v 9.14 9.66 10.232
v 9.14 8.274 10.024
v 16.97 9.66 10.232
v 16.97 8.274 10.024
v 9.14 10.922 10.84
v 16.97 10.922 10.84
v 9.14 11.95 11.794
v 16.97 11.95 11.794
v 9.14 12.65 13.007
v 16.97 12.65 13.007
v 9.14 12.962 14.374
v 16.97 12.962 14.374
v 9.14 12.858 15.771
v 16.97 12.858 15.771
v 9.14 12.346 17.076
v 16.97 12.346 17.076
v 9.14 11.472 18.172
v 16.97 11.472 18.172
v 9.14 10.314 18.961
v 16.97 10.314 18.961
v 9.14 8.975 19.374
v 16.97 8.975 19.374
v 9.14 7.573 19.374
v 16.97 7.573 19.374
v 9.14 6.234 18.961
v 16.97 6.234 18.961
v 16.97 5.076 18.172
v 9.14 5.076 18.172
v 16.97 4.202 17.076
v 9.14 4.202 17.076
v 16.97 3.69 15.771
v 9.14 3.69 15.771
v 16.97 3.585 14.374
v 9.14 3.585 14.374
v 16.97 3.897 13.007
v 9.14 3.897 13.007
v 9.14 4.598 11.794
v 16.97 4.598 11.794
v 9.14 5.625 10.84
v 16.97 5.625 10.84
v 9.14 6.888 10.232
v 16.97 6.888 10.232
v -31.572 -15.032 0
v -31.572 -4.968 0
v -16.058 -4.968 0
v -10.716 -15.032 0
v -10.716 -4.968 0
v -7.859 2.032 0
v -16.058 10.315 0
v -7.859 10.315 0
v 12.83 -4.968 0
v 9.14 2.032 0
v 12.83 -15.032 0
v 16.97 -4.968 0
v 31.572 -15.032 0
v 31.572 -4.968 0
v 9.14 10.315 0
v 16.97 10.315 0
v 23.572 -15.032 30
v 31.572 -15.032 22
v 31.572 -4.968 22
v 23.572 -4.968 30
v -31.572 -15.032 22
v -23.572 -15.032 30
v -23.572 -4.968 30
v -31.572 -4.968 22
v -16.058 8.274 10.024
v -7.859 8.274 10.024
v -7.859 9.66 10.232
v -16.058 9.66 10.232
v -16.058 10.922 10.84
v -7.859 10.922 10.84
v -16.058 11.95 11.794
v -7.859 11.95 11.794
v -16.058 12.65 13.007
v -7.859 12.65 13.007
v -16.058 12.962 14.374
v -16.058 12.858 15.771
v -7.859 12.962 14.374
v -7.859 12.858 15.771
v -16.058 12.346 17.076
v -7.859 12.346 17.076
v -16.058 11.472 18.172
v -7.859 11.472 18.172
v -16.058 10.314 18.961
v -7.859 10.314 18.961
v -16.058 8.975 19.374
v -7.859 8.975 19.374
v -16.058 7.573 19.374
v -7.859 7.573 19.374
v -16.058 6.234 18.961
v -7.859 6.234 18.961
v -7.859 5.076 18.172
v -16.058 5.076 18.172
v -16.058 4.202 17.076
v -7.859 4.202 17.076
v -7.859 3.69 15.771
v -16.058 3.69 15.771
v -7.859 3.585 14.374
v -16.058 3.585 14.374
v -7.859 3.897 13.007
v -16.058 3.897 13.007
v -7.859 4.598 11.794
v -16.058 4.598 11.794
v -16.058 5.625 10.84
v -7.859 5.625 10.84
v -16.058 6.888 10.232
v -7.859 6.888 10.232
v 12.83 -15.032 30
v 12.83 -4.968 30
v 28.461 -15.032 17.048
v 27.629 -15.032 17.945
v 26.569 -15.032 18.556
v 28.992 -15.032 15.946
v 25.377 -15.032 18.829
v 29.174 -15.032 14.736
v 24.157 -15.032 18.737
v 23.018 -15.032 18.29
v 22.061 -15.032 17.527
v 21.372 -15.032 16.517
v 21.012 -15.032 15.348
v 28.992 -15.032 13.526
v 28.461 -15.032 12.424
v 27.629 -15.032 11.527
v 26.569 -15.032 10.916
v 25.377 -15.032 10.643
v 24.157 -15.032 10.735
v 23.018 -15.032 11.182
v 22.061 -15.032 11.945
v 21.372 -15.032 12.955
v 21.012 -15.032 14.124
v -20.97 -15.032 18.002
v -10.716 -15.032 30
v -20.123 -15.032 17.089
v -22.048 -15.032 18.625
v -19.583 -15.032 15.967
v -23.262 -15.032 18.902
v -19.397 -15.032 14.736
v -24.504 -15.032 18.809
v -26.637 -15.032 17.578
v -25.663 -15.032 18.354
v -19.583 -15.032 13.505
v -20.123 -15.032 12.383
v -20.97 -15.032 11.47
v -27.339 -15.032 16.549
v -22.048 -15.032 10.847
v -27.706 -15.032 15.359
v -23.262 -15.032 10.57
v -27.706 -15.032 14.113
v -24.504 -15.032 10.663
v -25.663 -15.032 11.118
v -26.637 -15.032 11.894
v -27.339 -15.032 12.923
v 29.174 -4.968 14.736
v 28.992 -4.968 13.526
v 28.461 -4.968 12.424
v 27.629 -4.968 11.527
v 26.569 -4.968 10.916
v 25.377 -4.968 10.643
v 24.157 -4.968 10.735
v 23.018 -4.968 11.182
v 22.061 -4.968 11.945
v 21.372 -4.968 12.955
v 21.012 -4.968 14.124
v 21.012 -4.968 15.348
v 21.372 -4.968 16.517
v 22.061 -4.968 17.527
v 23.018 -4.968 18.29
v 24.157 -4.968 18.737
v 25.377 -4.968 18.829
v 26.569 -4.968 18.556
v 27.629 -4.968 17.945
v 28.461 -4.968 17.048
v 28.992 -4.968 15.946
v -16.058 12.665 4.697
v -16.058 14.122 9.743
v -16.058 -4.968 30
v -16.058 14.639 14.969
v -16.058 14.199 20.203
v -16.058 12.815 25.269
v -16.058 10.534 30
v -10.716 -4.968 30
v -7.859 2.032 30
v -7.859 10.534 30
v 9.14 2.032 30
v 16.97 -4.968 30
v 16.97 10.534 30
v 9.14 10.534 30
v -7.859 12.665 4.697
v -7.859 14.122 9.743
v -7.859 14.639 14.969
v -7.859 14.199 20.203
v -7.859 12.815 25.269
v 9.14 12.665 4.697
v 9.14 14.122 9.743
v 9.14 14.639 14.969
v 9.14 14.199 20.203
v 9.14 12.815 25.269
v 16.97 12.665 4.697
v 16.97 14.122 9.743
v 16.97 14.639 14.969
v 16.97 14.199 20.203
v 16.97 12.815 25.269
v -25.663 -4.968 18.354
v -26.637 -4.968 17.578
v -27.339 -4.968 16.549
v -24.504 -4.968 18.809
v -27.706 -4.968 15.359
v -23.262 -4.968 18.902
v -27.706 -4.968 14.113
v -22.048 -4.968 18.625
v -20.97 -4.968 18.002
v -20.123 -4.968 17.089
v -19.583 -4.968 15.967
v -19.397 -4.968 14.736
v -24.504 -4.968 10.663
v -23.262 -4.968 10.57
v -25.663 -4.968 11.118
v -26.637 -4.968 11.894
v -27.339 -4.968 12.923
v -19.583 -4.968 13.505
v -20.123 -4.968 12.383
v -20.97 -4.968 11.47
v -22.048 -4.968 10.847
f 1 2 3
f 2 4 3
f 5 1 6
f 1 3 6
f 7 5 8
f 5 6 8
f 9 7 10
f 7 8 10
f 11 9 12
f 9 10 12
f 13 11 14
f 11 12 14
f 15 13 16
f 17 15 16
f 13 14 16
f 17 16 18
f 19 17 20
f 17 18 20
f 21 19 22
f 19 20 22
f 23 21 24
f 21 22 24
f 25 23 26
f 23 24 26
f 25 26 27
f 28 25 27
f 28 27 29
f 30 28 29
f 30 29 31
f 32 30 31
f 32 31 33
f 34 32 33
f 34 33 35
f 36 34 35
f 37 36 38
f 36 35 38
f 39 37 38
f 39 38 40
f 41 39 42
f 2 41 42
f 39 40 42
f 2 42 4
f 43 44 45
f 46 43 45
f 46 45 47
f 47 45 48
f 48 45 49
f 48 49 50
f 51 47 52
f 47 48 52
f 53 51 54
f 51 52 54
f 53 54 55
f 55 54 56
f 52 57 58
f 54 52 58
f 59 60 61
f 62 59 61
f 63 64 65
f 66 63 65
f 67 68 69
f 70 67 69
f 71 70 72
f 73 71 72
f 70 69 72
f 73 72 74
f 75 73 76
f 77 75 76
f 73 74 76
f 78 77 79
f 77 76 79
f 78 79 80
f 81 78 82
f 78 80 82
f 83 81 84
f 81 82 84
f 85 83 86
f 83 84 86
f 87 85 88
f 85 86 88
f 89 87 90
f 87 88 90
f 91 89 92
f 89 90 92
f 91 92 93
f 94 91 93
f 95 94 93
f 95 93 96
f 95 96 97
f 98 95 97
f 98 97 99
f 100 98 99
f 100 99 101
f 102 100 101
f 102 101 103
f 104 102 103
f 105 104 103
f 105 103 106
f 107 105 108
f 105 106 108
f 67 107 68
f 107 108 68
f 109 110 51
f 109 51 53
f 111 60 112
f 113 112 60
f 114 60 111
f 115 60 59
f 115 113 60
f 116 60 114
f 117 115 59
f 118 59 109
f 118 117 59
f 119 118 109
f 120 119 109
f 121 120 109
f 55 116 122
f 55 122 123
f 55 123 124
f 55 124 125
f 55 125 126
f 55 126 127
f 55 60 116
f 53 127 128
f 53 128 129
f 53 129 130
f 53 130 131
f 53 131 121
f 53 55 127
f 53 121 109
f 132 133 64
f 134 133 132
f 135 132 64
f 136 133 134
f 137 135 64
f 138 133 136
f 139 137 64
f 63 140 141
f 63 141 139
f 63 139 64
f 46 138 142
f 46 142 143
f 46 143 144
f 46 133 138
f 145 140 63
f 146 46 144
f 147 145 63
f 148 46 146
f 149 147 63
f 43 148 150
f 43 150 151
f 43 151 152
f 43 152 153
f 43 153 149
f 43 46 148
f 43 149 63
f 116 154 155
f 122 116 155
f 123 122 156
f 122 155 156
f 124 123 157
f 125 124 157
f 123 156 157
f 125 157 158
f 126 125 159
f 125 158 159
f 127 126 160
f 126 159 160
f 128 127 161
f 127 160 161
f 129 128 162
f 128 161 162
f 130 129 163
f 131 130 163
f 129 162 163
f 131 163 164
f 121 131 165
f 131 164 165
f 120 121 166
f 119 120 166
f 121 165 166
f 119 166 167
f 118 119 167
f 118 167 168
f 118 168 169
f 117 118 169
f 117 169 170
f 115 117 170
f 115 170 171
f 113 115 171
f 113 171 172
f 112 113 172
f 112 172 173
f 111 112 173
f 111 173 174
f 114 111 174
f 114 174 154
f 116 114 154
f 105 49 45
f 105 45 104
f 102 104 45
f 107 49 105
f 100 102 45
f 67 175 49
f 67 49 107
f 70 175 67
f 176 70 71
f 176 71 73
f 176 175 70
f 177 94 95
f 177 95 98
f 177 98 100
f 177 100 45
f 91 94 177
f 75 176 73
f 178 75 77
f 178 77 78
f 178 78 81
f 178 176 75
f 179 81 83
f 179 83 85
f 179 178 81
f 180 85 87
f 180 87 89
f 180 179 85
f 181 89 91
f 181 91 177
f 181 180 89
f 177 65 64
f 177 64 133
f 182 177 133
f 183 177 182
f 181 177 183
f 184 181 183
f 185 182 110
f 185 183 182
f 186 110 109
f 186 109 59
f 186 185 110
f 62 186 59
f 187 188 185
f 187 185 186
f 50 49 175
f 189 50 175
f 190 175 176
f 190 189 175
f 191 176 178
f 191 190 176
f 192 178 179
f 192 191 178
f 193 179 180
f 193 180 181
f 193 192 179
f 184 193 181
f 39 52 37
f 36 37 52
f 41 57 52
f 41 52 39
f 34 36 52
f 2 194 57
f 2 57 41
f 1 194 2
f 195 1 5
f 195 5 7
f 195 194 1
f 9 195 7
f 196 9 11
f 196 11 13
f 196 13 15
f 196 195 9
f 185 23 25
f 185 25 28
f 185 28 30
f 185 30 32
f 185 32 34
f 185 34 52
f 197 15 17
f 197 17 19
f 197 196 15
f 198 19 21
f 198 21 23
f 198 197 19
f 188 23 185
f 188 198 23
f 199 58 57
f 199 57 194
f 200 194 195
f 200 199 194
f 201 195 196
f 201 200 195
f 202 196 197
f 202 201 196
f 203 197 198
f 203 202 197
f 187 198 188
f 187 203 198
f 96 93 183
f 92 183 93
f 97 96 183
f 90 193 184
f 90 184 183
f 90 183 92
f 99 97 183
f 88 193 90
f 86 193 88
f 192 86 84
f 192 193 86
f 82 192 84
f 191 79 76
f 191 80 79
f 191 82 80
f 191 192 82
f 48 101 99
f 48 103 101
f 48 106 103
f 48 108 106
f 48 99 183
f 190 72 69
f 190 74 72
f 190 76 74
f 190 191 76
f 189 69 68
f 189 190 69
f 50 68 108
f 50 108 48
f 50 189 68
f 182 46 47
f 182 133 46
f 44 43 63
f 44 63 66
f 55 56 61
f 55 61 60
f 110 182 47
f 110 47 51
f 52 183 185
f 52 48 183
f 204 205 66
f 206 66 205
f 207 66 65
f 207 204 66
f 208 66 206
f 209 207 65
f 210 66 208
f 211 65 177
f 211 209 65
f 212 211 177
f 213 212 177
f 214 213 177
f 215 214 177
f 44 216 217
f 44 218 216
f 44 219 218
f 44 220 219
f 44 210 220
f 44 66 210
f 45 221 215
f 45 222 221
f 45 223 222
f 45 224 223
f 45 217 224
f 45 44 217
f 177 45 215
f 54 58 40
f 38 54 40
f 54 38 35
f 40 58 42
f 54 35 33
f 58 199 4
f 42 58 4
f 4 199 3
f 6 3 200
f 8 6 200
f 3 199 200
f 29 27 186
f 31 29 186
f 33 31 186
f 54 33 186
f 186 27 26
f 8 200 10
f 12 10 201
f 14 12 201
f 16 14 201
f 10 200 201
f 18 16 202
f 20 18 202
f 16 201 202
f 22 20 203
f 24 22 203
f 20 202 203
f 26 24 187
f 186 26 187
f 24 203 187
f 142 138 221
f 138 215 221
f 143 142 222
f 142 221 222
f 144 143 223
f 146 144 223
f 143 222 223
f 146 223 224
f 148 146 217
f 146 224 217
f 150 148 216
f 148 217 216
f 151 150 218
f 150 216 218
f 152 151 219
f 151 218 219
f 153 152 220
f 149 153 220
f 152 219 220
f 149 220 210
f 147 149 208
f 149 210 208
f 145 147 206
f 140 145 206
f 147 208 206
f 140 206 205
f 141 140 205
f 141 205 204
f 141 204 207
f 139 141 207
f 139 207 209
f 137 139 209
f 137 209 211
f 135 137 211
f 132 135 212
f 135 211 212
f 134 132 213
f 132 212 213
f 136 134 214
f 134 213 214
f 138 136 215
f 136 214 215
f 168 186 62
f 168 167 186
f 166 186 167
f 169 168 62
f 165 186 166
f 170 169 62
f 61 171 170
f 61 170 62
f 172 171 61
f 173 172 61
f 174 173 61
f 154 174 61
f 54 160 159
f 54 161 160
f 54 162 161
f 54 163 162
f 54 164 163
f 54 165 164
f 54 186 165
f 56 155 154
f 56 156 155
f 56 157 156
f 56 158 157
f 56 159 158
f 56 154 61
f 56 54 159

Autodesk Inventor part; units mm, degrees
ref_plane "YZ Plane" through (0, 0, 0) normal (1, 0, 0) x (0, 1, 0)
ref_plane "XZ Plane" through (0, 0, 0) normal (0, 1, 0) x (-1, 0, 0)
ref_plane "XY Plane" through (0, 0, 0) normal (0, 0, 1) x (1, 0, 0)
sketch "스케치1" plane through (0, 0, 0) normal (0, 0, 1) x (1, 0, 0)
  line L0 (31.5724, -15.0322) -> (-31.5724, -15.0322)
  line L1 (-31.5724, -15.0322) -> (-31.5724, 15.0322)
  line L2 (-31.5724, 15.0322) -> (31.5724, 15.0322)
  line L3 (31.5724, 15.0322) -> (31.5724, -15.0322)
  line L4 (31.5724, -15.0322) -> (-31.5724, 15.0322) construction
  line L5 (-31.5724, -15.0322) -> (31.5724, 15.0322) construction
  point P0 (0, 0)
extrude "돌출1" add sketch "스케치1" along normal blind 30
sketch "스케치2" plane through (-31.5724, 15.0322, 0) normal (0, 1, 0) x (1, 0, 0)
  point P0 (31.5724, 0)
sketch "스케치3" plane through (-31.5724, 15.0322, 0) normal (0, 1, 0) x (1, 0, 0)
  line L0 (63.1447, 0) -> (0, 0) projected
  line L1 (15.5145, 0) -> (15.5145, -30)
  line L2 (0, -30) -> (63.1447, -30) projected
  line L3 (48.5426, 0) -> (48.5426, -30)
  line L4 (63.1447, -30) -> (0, -30) projected
  line L5 (15.5145, -30) -> (0, -30)
  line L6 (0, 0) -> (63.1447, 0) projected
  line L7 (0, -30) -> (0, 0)
  line L8 (0, 0) -> (15.5145, 0)
  line L9 (48.5426, 0) -> (63.1447, 0)
  line L10 (63.1447, 0) -> (63.1447, -30)
  line L11 (63.1447, -30) -> (48.5426, -30)
  line L12 (23.7136, 0) -> (40.7128, 0)
  line L13 (40.7128, 0) -> (40.7128, -30)
  line L14 (40.7128, -30) -> (23.7136, -30)
  line L15 (23.7136, -30) -> (23.7136, 0)
  point P0 (31.5724, 0)
extrude "돌출2" cut sketch "스케치3" against normal blind 20 contours L10 L2 L3 L0 | L1 L2 L7 L0
extrude "돌출3" cut sketch "스케치3" against normal blind 13 contours L13 L2 L15 L0
sketch "스케치4" plane through (0, 0, 30) normal (0, 0, 1) x (1, 0, 0)
  line L0 (-31.5724, -15.0322) -> (31.5724, -15.0322) projected
  line L1 (-10.7158, -4.9678) -> (12.8298, -4.9678)
  line L2 (12.8298, -4.9678) -> (12.8298, -15.0322)
  line L3 (12.8298, -15.0322) -> (-10.7158, -15.0322)
  line L4 (-10.7158, -15.0322) -> (-10.7158, -4.9678)
  point P0 (0, 0)
extrude "돌출4" cut sketch "스케치4" against normal blind 50
sketch "스케치5" plane through (16.9702, 15.0322, 30) normal (1, 0, 0) x (0, 0, -1)
  circle A0 centre (15.2748, -6.7584) radius 4.7017
  point P0 (30, -15.0322)
extrude "돌출5" cut sketch "스케치5" against normal blind 50
sketch "스케치6" plane through (-31.5724, -4.9678, 0) normal (0, 1, 0) x (1, 0, 0)
  circle A0 centre (56.6423, -14.736) radius 4.1041
  circle A1 centre (7.9978, -14.736) radius 4.1777
  point P0 (31.5724, 0)
extrude "돌출6" cut sketch "스케치6" against normal blind 50
chamfer "모따기1" distance 8 angle 45 2 edges at (-31.5724, -10, 30) (31.5724, -10, 30)
sketch "스케치7" plane through (16.9702, 15.0322, 30) normal (1, 0, 0) x (0, 0, -1)
  point P0 (30, -15.0322)
sketch "스케치8" plane through (16.9702, 15.0322, 30) normal (1, 0, 0) x (0, 0, -1)
  line L0 (30, 0) -> (30, -20) projected
  line L1 (0, 0) -> (0, -13) projected
  arc A0 (30, -4.7173) -> (0, -4.4986) centre (14.8208, -29.1901) ccw
  line L2 (0, -4.4986) -> (0, 0)
  line L3 (0, 0) -> (30, 0) projected
  line L4 (30, 0) -> (30, -4.7173)
  point P0 (30, -15.0322)
extrude "돌출7" cut sketch "스케치8" against normal blind 50
properties part number "240510_3Dsketch07"
